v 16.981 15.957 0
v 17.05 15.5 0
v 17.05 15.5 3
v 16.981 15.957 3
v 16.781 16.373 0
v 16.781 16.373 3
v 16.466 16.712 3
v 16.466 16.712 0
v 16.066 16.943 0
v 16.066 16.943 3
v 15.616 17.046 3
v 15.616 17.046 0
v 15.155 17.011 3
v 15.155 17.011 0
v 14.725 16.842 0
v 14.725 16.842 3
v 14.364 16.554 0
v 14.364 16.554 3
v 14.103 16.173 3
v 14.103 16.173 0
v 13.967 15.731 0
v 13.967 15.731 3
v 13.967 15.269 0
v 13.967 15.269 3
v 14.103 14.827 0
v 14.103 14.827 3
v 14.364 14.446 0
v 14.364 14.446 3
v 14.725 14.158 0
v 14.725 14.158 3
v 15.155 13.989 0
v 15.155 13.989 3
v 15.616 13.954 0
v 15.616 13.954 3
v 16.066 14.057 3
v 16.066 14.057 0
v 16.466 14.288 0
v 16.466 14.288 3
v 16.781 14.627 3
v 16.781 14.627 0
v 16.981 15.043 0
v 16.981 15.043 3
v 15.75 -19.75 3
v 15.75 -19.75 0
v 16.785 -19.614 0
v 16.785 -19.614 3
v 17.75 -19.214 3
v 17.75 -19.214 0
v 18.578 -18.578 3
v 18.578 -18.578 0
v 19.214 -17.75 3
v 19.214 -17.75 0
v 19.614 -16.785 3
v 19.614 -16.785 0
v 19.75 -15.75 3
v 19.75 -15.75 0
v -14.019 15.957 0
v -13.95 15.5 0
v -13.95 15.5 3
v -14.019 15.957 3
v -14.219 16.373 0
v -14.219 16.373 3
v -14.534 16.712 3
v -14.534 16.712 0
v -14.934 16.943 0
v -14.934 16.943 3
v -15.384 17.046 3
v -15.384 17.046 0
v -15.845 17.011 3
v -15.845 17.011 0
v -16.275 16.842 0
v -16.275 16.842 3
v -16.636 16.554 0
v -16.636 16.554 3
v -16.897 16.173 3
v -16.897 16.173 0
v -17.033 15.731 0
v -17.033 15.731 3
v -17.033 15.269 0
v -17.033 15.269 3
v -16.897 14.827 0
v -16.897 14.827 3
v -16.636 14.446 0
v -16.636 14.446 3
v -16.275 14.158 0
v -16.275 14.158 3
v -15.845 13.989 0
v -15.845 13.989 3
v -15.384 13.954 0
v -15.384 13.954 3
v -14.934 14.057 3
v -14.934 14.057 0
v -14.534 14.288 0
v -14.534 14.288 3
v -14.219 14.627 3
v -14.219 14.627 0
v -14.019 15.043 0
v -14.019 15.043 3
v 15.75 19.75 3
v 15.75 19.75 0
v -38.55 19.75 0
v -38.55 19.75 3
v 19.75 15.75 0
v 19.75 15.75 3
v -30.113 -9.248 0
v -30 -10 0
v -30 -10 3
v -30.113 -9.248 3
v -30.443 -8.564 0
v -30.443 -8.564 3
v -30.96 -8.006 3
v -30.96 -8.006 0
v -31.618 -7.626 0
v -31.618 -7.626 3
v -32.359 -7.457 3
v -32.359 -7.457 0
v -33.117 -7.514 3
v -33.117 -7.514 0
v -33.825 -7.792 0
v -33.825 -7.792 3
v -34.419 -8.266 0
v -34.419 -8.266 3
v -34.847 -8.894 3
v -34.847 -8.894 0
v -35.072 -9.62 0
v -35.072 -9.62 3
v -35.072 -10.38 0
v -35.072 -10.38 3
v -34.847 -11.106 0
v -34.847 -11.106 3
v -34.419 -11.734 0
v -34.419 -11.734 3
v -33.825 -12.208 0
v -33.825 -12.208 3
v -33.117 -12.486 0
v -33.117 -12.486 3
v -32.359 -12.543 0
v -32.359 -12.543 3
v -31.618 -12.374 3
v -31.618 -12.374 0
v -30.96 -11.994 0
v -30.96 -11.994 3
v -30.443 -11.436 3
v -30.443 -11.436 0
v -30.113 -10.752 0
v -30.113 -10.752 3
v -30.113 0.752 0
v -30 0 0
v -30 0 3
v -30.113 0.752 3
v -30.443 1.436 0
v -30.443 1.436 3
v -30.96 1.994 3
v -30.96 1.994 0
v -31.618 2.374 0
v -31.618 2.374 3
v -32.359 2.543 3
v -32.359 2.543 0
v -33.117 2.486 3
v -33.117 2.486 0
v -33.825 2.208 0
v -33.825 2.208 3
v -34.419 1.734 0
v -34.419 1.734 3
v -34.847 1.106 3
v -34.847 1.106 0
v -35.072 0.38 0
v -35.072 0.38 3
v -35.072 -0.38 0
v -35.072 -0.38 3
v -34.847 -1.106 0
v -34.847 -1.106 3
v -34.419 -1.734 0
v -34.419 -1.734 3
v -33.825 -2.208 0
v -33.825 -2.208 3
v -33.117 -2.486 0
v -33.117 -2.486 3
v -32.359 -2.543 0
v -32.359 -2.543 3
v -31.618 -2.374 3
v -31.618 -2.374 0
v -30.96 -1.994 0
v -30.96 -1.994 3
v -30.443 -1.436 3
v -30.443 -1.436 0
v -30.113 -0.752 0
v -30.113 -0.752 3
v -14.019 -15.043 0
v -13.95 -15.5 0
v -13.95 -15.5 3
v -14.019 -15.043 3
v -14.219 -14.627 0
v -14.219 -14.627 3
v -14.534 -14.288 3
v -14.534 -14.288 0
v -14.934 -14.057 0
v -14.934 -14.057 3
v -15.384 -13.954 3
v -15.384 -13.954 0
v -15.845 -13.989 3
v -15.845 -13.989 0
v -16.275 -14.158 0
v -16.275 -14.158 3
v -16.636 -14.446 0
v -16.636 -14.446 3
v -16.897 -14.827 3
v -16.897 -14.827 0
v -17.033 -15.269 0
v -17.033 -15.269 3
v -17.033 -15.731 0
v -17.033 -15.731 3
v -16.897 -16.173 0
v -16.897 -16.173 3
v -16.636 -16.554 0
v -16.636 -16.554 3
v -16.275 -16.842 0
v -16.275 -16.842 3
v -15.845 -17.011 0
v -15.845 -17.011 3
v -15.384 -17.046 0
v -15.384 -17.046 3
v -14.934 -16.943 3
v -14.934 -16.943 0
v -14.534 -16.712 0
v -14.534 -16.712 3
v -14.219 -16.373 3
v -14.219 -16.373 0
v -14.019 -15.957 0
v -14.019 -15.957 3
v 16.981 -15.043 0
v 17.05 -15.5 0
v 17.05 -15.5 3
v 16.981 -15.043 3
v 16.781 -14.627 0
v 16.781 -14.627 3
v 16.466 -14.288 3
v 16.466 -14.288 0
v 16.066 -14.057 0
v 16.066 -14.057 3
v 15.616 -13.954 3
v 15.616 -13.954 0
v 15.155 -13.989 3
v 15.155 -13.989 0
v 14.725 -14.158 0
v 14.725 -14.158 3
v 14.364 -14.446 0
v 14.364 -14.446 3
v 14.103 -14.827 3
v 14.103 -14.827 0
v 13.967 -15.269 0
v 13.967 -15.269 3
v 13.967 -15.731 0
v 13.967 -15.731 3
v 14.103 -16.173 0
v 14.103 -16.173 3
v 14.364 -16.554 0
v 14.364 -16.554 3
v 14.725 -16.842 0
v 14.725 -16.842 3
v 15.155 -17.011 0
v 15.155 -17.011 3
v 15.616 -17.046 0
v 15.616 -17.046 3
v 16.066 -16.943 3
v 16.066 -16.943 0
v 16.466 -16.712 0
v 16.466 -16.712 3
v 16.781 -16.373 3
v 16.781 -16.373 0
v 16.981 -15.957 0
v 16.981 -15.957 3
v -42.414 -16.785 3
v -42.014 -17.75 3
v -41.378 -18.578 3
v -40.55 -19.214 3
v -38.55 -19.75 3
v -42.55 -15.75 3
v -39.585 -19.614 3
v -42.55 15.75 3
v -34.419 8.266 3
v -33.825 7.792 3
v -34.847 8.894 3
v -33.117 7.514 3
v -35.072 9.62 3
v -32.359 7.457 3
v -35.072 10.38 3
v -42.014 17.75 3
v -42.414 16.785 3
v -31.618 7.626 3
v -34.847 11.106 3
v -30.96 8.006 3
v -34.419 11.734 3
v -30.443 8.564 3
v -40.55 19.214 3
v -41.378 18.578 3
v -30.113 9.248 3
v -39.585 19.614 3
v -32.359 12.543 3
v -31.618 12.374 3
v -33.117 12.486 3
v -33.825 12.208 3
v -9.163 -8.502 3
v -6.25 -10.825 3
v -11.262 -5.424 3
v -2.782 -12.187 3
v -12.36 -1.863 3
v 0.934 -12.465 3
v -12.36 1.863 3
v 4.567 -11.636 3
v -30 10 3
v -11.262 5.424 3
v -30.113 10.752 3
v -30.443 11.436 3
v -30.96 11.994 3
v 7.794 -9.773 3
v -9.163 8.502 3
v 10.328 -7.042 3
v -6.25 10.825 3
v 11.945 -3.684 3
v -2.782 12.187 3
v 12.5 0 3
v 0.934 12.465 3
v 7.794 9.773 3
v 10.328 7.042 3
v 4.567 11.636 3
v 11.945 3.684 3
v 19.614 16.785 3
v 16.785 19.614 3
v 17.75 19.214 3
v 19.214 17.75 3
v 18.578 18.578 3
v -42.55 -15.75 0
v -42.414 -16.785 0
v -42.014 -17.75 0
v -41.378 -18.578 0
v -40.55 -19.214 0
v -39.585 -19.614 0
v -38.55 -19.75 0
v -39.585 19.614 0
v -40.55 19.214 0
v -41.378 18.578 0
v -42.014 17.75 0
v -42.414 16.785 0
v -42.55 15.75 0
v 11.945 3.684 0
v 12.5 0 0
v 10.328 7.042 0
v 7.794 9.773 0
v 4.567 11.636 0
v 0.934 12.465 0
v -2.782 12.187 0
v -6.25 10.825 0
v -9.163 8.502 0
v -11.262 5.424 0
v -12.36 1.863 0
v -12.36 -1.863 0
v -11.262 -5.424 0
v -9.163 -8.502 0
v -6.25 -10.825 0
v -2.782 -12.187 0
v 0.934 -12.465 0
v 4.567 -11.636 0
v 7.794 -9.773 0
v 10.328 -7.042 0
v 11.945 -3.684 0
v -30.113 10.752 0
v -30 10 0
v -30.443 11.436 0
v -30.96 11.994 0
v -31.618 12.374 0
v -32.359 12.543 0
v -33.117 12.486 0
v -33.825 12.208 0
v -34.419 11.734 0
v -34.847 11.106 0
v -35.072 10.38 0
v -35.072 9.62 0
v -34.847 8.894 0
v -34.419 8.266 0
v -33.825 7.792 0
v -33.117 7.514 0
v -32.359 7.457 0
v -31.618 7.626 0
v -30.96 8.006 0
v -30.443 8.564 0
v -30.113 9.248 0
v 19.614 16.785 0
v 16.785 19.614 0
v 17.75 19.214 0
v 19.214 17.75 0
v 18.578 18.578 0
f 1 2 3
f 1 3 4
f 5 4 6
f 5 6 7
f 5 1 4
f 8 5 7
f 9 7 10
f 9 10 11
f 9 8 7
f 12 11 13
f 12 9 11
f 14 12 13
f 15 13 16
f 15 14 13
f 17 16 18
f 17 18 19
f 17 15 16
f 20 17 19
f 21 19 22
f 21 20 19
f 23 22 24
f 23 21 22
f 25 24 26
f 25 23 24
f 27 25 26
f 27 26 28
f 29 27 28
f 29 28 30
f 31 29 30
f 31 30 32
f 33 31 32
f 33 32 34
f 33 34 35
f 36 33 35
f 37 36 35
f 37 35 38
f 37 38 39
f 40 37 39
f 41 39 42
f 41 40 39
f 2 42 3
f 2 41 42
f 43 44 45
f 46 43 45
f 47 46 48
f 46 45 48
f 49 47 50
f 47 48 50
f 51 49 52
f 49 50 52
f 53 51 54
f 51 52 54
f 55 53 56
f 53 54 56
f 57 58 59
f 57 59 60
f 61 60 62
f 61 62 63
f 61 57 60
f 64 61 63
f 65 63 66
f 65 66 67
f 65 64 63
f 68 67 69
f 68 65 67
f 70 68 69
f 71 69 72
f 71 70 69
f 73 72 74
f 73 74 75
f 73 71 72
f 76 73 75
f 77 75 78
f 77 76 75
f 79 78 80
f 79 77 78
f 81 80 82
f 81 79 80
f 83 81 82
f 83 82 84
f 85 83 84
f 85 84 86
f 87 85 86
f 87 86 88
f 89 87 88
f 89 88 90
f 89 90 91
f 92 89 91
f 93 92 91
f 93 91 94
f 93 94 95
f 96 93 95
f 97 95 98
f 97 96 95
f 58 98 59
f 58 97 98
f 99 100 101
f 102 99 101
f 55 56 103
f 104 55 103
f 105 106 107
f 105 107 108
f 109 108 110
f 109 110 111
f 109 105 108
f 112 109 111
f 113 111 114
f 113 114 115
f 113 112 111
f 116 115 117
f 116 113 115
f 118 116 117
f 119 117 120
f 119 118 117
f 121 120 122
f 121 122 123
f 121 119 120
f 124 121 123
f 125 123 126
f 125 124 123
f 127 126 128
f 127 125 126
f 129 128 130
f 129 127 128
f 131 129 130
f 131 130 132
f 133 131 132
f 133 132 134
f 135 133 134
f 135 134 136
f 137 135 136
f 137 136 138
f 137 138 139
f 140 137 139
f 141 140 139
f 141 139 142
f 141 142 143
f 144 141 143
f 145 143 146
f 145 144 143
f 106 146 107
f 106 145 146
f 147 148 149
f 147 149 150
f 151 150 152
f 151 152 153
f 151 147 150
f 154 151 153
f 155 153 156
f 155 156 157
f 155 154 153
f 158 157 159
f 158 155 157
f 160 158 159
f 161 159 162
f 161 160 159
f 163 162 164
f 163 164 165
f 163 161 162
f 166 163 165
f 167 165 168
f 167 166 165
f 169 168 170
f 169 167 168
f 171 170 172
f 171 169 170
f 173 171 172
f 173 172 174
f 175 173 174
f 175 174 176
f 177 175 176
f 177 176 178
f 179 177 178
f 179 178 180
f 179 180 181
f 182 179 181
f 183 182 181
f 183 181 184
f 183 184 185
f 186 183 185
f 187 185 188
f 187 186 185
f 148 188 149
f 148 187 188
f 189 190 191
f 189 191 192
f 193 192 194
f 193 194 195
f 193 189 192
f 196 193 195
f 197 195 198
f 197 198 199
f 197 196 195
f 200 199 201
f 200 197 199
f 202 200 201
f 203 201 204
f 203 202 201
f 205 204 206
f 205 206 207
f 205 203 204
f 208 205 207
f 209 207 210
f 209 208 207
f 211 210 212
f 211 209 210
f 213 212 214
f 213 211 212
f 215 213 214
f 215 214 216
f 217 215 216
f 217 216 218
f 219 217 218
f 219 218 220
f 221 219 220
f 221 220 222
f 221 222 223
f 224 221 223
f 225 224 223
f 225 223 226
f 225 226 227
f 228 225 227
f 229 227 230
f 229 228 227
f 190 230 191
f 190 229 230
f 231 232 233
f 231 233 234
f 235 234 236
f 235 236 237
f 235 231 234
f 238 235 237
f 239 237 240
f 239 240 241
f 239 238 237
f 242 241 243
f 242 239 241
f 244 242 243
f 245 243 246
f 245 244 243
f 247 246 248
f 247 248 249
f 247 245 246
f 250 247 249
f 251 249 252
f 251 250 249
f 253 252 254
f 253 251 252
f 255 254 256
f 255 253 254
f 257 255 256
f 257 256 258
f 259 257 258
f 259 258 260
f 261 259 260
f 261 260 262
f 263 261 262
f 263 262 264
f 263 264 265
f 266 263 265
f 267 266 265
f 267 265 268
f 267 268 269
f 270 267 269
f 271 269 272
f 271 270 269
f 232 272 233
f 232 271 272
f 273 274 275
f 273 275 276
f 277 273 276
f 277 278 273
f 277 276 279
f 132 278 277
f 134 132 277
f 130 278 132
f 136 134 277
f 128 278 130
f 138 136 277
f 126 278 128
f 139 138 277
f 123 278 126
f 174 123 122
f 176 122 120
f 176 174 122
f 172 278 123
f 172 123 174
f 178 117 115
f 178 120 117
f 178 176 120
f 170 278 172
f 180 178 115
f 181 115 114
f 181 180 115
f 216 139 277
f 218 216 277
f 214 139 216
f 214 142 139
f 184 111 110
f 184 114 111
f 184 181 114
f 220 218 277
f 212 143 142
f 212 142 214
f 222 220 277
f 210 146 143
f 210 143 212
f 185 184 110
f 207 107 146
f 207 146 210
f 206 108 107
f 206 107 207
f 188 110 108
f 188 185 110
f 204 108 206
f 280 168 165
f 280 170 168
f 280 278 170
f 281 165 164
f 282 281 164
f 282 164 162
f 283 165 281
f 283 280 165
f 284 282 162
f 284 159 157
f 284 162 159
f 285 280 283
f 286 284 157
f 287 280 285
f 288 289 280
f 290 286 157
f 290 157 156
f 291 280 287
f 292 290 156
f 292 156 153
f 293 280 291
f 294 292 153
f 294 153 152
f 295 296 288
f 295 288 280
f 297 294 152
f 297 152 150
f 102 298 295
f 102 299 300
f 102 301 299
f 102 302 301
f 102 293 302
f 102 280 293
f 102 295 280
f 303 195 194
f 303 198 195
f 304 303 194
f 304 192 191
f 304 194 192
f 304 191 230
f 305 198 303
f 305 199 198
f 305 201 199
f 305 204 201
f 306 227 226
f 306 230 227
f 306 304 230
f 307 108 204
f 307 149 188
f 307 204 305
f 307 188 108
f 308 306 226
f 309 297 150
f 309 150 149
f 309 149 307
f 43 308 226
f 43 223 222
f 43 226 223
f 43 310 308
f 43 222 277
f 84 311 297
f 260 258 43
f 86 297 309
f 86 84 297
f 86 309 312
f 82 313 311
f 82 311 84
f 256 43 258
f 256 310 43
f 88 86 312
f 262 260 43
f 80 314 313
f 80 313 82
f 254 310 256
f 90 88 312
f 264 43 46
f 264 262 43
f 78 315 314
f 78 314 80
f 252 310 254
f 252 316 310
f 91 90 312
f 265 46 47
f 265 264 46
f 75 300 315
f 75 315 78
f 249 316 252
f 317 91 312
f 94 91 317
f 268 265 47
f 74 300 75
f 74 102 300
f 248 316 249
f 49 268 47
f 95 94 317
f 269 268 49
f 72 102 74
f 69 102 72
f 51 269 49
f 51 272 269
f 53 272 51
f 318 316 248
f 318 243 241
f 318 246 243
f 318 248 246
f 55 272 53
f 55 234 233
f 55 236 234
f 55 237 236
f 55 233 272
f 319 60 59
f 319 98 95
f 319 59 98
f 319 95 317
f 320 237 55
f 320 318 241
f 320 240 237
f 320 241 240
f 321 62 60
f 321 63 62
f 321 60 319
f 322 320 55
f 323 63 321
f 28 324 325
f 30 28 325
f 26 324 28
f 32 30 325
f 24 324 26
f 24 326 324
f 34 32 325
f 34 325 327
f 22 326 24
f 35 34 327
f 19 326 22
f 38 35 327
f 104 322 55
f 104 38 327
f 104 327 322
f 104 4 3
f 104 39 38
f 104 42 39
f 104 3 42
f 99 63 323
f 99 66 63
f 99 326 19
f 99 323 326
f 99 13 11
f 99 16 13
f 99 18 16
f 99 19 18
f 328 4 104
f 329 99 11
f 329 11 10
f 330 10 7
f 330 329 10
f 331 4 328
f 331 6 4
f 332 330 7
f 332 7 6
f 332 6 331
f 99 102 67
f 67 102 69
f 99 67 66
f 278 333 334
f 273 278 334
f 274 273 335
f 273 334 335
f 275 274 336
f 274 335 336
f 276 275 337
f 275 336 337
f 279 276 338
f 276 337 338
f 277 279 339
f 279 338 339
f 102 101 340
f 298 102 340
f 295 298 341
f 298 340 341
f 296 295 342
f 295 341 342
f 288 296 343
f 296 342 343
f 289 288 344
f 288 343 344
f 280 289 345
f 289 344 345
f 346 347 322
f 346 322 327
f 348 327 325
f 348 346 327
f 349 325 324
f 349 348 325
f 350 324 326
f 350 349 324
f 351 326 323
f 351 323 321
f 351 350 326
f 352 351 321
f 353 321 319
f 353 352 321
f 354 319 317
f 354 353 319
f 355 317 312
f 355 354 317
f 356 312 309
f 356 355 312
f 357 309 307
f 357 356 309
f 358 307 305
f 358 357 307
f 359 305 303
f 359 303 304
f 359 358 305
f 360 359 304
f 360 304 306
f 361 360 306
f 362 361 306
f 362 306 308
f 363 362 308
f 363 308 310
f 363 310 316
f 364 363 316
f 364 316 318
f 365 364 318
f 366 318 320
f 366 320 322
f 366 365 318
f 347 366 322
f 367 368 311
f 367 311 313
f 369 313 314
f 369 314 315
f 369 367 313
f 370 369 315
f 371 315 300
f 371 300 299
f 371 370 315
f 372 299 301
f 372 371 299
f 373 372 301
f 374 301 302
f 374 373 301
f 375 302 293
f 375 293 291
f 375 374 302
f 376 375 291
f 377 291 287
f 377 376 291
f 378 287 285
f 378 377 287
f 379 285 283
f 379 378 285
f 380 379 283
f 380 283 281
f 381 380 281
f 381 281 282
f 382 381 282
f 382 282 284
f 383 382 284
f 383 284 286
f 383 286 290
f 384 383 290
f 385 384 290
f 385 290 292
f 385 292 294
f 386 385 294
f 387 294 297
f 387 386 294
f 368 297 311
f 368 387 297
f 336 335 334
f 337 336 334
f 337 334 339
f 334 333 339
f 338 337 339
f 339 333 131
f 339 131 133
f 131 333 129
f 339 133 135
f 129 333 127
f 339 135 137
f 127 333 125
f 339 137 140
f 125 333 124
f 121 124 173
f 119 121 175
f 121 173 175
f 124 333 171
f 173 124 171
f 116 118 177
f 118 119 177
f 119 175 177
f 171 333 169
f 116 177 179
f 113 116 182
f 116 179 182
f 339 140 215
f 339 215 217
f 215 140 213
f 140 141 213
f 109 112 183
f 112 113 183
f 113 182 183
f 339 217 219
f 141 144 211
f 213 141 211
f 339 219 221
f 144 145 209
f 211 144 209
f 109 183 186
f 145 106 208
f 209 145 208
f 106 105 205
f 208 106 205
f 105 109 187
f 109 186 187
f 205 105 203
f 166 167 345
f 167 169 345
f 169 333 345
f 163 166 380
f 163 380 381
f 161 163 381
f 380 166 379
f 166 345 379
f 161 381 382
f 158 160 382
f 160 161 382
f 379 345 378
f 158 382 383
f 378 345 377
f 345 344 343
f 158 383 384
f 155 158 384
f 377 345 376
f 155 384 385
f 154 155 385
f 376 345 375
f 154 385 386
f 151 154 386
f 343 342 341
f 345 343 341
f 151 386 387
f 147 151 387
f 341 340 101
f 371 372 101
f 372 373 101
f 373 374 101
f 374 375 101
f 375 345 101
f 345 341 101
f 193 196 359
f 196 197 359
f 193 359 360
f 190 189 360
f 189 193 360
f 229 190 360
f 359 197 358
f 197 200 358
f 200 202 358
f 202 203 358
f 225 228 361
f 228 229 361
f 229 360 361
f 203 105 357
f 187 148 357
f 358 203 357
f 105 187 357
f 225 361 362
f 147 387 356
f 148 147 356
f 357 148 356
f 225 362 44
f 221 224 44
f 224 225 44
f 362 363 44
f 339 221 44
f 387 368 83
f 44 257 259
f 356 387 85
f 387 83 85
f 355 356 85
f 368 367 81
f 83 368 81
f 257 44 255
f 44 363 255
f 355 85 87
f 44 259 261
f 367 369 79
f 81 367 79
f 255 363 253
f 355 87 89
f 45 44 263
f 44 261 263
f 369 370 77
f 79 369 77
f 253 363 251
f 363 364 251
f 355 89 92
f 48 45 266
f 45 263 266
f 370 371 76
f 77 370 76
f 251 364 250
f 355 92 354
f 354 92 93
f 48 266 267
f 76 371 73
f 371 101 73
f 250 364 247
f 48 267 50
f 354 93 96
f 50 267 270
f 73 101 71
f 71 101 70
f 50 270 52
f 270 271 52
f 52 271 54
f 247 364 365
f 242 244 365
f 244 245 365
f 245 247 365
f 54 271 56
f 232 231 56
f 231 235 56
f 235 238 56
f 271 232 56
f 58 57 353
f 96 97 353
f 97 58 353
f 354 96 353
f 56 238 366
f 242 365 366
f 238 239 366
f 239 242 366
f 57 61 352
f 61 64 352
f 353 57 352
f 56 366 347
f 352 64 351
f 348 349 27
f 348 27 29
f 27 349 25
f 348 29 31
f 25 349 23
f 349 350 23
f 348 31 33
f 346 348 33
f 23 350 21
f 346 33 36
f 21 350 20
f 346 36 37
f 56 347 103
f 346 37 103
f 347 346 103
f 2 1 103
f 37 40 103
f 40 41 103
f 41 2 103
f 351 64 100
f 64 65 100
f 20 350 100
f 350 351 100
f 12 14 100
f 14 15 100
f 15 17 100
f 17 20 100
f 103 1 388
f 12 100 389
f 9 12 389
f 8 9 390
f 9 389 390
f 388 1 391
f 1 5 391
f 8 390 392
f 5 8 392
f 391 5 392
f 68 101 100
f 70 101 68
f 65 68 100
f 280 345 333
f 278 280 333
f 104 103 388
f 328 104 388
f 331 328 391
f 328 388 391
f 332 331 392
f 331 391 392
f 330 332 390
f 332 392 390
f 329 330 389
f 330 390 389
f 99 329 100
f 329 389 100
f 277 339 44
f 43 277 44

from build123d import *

# Parameters (mm, degrees)
F0_R     = 2.55
F0_R_2   = 1.55
F0_R_3   = 12.5
F1_DEPTH = 3


with BuildPart() as f1:
    # F0 (on Top) → F1 (new body)
    with BuildSketch(Plane.XY):
        with BuildLine():
            ThreePointArc((19.75, 15.75), (18.578427, 18.578427), (15.75, 19.75))
            Line((15.75, 19.75), (-38.55, 19.75))
            ThreePointArc((-38.55, 19.75), (-41.378427, 18.578427), (-42.55, 15.75))
            Line((-42.55, 15.75), (-42.55, -15.75))
            ThreePointArc((-42.55, -15.75), (-41.378427, -18.578427), (-38.55, -19.75))
            Line((-38.55, -19.75), (15.75, -19.75))
            ThreePointArc((15.75, -19.75), (18.578427, -18.578427), (19.75, -15.75))
            Line((19.75, -15.75), (19.75, 15.75))
        make_face()
        with Locations((-32.55, -10)):
            Circle(F0_R, mode=Mode.SUBTRACT)
        with Locations((-15.5, -15.5)):
            Circle(F0_R_2, mode=Mode.SUBTRACT)
        with Locations((15.5, -15.5)):
            Circle(F0_R_2, mode=Mode.SUBTRACT)
        with Locations((-32.55, 0)):
            Circle(F0_R, mode=Mode.SUBTRACT)
        with Locations((-32.55, 10)):
            Circle(F0_R, mode=Mode.SUBTRACT)
        with Locations((-15.5, 15.5)):
            Circle(F0_R_2, mode=Mode.SUBTRACT)
        Circle(F0_R_3, mode=Mode.SUBTRACT)
        with Locations((15.5, 15.5)):
            Circle(F0_R_2, mode=Mode.SUBTRACT)
    extrude(amount=F1_DEPTH)


solid = f1.part
